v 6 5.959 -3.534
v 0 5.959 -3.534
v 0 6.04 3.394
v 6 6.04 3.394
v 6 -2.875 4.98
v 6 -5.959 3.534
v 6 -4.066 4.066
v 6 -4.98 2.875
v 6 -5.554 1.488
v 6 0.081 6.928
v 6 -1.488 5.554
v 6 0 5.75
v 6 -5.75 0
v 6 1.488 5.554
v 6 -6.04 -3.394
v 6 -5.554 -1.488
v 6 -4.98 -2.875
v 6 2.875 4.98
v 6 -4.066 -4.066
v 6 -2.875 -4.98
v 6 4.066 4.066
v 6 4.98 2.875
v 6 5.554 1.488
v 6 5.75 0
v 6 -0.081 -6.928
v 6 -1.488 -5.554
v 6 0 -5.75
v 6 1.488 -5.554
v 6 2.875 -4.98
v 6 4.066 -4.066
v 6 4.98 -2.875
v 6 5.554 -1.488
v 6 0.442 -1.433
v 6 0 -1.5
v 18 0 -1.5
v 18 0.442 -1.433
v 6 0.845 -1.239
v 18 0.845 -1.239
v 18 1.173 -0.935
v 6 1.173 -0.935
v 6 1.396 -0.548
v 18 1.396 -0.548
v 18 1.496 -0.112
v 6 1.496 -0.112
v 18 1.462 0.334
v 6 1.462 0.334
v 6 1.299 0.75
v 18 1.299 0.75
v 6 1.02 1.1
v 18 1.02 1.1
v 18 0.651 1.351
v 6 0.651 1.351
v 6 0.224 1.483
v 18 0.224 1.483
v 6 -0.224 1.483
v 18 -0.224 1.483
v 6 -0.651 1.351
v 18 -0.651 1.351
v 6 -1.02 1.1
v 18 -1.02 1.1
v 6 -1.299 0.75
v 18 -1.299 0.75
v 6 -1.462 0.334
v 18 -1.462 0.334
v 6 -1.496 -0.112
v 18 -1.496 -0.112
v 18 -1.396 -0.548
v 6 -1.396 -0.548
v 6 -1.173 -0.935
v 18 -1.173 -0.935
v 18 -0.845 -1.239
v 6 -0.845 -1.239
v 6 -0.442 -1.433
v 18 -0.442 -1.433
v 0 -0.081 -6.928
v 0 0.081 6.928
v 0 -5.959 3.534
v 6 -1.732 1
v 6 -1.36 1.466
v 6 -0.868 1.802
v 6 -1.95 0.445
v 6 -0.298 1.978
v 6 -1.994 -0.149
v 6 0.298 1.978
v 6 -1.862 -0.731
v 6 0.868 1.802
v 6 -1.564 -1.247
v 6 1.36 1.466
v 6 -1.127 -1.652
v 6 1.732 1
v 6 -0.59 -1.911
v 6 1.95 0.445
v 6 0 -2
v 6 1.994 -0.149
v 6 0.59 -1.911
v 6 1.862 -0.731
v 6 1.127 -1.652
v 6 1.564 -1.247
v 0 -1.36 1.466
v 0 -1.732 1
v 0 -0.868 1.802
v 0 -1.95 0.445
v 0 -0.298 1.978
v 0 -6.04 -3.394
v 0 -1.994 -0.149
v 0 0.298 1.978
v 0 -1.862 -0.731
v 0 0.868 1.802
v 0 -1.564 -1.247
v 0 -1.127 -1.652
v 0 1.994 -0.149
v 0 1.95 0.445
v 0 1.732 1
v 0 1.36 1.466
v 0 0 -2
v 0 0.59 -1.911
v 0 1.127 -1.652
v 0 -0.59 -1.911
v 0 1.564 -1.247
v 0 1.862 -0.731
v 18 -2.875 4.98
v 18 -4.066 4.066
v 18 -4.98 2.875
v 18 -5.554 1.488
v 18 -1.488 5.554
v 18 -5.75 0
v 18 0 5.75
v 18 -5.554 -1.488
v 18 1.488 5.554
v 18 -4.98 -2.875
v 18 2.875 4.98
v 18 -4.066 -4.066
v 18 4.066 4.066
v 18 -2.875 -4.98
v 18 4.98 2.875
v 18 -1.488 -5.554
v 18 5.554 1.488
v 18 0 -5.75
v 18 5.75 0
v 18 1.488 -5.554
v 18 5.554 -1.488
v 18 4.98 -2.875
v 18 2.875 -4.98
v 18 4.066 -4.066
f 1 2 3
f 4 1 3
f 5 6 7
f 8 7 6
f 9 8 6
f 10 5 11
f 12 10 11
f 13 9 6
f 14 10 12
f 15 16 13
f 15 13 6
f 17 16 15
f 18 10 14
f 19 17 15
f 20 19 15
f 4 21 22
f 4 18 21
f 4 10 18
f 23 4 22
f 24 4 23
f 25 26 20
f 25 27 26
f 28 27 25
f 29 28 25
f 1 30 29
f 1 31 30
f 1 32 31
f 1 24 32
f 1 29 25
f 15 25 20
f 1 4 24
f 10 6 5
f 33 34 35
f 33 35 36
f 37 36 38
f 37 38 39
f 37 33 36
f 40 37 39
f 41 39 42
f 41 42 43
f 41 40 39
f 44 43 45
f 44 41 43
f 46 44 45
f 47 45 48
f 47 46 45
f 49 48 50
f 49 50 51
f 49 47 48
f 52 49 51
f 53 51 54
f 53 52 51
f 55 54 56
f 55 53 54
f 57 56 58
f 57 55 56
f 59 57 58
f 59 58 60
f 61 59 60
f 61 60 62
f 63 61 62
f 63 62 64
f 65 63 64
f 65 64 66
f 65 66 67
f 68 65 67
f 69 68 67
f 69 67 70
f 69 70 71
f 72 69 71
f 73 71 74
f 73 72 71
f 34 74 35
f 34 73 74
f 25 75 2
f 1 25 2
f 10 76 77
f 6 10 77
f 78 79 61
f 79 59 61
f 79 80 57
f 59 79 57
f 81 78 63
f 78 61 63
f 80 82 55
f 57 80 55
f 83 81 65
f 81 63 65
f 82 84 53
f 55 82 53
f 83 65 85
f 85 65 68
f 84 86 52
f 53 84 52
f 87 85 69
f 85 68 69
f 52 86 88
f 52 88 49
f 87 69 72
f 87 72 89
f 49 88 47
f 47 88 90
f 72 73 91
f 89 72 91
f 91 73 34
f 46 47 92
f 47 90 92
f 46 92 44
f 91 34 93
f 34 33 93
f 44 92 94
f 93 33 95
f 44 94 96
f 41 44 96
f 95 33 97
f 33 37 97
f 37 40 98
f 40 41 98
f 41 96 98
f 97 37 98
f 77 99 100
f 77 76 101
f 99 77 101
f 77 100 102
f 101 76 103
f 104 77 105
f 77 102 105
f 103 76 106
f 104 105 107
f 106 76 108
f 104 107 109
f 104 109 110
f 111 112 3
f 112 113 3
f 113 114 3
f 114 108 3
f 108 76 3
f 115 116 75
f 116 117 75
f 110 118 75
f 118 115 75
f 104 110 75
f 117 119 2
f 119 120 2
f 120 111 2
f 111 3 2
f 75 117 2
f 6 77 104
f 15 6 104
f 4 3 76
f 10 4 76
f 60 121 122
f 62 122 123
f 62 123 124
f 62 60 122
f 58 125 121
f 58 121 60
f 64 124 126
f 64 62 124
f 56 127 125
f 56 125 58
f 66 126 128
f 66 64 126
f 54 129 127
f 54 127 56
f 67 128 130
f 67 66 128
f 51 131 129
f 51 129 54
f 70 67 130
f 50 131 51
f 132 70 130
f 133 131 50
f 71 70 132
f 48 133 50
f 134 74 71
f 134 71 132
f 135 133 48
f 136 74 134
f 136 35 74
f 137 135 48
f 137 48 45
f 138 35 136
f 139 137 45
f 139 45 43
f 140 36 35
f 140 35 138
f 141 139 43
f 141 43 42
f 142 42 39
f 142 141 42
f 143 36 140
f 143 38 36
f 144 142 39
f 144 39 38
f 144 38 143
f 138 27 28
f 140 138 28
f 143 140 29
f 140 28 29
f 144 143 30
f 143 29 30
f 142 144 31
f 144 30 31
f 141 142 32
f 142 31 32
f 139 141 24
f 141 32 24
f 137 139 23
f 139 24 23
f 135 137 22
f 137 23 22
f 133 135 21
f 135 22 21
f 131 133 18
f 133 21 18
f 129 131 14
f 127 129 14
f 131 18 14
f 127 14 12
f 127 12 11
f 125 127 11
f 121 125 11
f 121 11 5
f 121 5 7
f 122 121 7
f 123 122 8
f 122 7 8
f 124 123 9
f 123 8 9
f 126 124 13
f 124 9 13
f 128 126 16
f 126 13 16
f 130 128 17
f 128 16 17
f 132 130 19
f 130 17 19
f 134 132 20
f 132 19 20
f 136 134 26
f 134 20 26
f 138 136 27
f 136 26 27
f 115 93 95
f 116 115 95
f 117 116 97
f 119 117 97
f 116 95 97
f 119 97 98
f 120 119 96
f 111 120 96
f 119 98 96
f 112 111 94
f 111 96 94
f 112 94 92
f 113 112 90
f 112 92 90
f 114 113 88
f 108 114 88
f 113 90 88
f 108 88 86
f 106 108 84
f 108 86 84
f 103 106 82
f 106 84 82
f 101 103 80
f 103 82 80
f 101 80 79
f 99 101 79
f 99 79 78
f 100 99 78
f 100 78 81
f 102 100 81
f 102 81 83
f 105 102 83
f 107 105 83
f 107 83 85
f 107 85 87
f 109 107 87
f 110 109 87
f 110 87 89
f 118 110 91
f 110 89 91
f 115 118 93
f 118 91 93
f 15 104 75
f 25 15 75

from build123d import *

# Parameters (mm, degrees)
BOSS_EXTRUDE1_DEPTH = 6
SKETCH2_R           = 2
CUT_EXTRUDE1_DEPTH  = 6
SKETCH3_R           = 5.75
SKETCH3_R_2         = 1.5
BOSS_EXTRUDE2_DEPTH = 12


with BuildPart() as part:
    # Sketch1 → Boss-Extrude1 (new body)
    with BuildSketch(Plane(origin=(0, 0, 0), x_dir=(0, 0, -1), z_dir=(1, 0, 0))):
        Polygon((3.393898061, -6.039988075), (6.927732142, -0.080792099), (3.533834081, 5.959195977), (-3.393898061, 6.039988075), (-6.927732142, 0.080792099), (-3.533834081, -5.959195977), align=None)
    extrude(amount=BOSS_EXTRUDE1_DEPTH)

    # Sketch2 → Cut-Extrude1 (cut)
    with BuildSketch(Plane(origin=(6, 0, 0), x_dir=(0, 0, -1), z_dir=(1, 0, 0))):
        Circle(SKETCH2_R)
    extrude(amount=-CUT_EXTRUDE1_DEPTH, mode=Mode.SUBTRACT)

    # Sketch3 → Boss-Extrude2 (add)
    with BuildSketch(Plane(origin=(6, 0, 0), x_dir=(0, 0, -1), z_dir=(1, 0, 0))):
        Circle(SKETCH3_R)
        Circle(SKETCH3_R_2, mode=Mode.SUBTRACT)
    extrude(amount=BOSS_EXTRUDE2_DEPTH)


solid = part.part
